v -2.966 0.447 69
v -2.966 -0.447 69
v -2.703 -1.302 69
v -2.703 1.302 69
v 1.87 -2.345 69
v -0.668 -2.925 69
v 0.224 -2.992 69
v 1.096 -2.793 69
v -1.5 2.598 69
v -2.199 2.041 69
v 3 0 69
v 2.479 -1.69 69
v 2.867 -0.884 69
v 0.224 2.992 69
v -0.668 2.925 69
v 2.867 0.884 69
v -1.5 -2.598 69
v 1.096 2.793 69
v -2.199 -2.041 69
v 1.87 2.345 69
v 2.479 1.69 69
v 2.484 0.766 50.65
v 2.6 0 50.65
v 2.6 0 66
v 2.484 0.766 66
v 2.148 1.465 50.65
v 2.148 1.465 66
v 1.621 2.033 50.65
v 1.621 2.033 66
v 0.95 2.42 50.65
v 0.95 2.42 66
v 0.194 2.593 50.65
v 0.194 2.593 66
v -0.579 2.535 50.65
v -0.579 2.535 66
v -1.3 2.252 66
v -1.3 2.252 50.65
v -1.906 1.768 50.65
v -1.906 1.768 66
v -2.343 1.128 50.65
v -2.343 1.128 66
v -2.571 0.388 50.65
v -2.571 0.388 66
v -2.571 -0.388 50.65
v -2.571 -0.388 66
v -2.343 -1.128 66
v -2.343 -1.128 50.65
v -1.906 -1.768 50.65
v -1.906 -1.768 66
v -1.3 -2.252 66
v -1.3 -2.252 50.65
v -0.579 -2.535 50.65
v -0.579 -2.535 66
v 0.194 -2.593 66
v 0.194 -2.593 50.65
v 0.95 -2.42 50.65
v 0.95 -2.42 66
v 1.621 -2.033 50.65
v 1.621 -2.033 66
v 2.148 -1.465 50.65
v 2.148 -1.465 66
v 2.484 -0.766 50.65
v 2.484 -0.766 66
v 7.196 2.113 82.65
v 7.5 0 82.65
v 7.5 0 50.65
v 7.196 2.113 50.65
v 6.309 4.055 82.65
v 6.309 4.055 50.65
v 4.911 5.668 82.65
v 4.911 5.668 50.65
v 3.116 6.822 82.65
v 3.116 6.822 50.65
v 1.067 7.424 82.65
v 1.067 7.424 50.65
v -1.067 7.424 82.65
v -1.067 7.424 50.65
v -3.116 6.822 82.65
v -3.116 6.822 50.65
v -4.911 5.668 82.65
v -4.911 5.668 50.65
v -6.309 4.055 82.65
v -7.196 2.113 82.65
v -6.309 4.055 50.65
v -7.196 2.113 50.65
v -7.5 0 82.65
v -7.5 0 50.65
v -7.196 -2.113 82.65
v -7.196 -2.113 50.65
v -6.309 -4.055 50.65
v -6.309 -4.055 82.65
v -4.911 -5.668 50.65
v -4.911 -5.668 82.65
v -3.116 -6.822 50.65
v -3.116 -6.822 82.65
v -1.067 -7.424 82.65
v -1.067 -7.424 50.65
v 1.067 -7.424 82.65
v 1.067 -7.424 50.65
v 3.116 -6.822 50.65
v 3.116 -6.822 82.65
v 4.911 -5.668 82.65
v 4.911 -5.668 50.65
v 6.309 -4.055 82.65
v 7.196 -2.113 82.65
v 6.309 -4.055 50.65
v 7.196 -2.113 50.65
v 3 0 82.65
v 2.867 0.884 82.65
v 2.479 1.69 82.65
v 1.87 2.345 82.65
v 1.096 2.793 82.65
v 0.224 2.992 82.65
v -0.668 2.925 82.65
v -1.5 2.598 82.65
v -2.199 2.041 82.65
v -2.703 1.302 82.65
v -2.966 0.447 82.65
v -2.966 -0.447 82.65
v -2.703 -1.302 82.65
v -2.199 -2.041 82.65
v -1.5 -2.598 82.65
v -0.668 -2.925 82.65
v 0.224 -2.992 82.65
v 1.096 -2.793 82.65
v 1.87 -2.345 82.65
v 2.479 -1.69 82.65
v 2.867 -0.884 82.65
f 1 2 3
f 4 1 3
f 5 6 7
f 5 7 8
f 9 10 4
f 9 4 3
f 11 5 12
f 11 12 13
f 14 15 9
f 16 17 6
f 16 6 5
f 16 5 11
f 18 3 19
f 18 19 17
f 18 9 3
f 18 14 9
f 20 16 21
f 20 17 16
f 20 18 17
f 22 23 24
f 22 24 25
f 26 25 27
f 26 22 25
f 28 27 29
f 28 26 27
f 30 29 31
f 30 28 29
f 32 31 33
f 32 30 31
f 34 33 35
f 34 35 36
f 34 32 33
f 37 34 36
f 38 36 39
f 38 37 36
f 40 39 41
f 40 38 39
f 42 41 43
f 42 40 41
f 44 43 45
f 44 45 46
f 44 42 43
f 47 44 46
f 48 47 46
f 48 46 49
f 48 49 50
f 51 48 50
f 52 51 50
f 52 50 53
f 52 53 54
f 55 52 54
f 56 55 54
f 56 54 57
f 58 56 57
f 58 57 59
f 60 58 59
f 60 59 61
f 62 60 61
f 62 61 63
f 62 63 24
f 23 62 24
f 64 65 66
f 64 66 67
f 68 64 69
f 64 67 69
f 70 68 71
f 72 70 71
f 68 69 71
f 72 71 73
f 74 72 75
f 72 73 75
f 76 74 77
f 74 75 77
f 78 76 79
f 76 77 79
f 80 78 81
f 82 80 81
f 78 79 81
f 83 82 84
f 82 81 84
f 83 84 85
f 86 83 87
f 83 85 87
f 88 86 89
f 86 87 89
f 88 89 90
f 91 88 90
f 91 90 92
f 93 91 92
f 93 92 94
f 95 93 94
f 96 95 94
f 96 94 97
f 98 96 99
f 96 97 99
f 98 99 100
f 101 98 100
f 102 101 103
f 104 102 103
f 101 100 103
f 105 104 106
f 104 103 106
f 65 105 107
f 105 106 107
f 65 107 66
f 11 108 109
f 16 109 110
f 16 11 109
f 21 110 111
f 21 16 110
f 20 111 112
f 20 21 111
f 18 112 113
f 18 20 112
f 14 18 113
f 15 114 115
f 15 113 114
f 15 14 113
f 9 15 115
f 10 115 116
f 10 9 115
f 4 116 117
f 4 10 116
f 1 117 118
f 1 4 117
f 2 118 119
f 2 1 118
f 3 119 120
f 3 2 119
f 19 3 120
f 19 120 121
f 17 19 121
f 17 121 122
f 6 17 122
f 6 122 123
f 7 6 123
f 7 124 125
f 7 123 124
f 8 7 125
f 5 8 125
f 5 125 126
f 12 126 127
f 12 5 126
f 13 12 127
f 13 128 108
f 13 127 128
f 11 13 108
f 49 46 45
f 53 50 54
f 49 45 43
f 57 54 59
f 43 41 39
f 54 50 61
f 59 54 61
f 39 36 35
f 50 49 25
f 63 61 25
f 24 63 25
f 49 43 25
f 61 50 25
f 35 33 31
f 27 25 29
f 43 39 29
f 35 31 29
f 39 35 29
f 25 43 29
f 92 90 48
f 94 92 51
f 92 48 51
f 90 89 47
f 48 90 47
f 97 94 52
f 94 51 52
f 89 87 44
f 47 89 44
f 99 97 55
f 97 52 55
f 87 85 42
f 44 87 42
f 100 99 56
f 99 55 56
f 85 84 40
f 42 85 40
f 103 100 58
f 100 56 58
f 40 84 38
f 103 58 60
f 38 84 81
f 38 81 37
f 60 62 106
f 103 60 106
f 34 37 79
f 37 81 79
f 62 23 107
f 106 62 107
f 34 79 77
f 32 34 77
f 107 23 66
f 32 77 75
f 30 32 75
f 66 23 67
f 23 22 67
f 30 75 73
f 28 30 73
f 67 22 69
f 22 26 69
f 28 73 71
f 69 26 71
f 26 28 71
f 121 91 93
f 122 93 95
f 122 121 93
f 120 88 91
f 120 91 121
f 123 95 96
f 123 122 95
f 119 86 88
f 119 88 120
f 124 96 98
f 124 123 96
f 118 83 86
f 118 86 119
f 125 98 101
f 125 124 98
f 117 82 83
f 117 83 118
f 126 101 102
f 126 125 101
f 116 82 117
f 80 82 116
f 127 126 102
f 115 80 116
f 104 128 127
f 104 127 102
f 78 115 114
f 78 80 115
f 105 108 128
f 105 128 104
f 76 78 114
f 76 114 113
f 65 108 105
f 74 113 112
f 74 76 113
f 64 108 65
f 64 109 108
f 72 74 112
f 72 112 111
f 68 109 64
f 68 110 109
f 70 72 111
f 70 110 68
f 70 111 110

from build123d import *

# Parameters (mm, degrees)
CYLINDER1798_R     = 3
CYLINDER1798_DEPTH = 20
CYLINDER1796_R     = 2.6
CYLINDER1796_DEPTH = 19
CYLINDER1797_R     = 7.5
CYLINDER1797_DEPTH = 32


with BuildPart() as v_lec1798:
    # Cylinder1798 → Cylinder1798 (new body)
    with BuildSketch(Plane.XY.offset(69)):
        Circle(CYLINDER1798_R)
    extrude(amount=CYLINDER1798_DEPTH)


with BuildPart() as v_lec1796:
    # Cylinder1796 → Cylinder1796 (new body)
    with BuildSketch(Plane.XY.offset(47)):
        Circle(CYLINDER1796_R)
    extrude(amount=CYLINDER1796_DEPTH)


with BuildPart() as cut668:
    # Cylinder1797 → Cylinder1797 (new body)
    with BuildSketch(Plane.XY.offset(50.65)):
        Circle(CYLINDER1797_R)
    extrude(amount=CYLINDER1797_DEPTH)

    # Cut666: cut Válec1796
    add(v_lec1796.part, mode=Mode.SUBTRACT)

    # Cut668: cut Válec1798
    add(v_lec1798.part, mode=Mode.SUBTRACT)


solid = cut668.part
